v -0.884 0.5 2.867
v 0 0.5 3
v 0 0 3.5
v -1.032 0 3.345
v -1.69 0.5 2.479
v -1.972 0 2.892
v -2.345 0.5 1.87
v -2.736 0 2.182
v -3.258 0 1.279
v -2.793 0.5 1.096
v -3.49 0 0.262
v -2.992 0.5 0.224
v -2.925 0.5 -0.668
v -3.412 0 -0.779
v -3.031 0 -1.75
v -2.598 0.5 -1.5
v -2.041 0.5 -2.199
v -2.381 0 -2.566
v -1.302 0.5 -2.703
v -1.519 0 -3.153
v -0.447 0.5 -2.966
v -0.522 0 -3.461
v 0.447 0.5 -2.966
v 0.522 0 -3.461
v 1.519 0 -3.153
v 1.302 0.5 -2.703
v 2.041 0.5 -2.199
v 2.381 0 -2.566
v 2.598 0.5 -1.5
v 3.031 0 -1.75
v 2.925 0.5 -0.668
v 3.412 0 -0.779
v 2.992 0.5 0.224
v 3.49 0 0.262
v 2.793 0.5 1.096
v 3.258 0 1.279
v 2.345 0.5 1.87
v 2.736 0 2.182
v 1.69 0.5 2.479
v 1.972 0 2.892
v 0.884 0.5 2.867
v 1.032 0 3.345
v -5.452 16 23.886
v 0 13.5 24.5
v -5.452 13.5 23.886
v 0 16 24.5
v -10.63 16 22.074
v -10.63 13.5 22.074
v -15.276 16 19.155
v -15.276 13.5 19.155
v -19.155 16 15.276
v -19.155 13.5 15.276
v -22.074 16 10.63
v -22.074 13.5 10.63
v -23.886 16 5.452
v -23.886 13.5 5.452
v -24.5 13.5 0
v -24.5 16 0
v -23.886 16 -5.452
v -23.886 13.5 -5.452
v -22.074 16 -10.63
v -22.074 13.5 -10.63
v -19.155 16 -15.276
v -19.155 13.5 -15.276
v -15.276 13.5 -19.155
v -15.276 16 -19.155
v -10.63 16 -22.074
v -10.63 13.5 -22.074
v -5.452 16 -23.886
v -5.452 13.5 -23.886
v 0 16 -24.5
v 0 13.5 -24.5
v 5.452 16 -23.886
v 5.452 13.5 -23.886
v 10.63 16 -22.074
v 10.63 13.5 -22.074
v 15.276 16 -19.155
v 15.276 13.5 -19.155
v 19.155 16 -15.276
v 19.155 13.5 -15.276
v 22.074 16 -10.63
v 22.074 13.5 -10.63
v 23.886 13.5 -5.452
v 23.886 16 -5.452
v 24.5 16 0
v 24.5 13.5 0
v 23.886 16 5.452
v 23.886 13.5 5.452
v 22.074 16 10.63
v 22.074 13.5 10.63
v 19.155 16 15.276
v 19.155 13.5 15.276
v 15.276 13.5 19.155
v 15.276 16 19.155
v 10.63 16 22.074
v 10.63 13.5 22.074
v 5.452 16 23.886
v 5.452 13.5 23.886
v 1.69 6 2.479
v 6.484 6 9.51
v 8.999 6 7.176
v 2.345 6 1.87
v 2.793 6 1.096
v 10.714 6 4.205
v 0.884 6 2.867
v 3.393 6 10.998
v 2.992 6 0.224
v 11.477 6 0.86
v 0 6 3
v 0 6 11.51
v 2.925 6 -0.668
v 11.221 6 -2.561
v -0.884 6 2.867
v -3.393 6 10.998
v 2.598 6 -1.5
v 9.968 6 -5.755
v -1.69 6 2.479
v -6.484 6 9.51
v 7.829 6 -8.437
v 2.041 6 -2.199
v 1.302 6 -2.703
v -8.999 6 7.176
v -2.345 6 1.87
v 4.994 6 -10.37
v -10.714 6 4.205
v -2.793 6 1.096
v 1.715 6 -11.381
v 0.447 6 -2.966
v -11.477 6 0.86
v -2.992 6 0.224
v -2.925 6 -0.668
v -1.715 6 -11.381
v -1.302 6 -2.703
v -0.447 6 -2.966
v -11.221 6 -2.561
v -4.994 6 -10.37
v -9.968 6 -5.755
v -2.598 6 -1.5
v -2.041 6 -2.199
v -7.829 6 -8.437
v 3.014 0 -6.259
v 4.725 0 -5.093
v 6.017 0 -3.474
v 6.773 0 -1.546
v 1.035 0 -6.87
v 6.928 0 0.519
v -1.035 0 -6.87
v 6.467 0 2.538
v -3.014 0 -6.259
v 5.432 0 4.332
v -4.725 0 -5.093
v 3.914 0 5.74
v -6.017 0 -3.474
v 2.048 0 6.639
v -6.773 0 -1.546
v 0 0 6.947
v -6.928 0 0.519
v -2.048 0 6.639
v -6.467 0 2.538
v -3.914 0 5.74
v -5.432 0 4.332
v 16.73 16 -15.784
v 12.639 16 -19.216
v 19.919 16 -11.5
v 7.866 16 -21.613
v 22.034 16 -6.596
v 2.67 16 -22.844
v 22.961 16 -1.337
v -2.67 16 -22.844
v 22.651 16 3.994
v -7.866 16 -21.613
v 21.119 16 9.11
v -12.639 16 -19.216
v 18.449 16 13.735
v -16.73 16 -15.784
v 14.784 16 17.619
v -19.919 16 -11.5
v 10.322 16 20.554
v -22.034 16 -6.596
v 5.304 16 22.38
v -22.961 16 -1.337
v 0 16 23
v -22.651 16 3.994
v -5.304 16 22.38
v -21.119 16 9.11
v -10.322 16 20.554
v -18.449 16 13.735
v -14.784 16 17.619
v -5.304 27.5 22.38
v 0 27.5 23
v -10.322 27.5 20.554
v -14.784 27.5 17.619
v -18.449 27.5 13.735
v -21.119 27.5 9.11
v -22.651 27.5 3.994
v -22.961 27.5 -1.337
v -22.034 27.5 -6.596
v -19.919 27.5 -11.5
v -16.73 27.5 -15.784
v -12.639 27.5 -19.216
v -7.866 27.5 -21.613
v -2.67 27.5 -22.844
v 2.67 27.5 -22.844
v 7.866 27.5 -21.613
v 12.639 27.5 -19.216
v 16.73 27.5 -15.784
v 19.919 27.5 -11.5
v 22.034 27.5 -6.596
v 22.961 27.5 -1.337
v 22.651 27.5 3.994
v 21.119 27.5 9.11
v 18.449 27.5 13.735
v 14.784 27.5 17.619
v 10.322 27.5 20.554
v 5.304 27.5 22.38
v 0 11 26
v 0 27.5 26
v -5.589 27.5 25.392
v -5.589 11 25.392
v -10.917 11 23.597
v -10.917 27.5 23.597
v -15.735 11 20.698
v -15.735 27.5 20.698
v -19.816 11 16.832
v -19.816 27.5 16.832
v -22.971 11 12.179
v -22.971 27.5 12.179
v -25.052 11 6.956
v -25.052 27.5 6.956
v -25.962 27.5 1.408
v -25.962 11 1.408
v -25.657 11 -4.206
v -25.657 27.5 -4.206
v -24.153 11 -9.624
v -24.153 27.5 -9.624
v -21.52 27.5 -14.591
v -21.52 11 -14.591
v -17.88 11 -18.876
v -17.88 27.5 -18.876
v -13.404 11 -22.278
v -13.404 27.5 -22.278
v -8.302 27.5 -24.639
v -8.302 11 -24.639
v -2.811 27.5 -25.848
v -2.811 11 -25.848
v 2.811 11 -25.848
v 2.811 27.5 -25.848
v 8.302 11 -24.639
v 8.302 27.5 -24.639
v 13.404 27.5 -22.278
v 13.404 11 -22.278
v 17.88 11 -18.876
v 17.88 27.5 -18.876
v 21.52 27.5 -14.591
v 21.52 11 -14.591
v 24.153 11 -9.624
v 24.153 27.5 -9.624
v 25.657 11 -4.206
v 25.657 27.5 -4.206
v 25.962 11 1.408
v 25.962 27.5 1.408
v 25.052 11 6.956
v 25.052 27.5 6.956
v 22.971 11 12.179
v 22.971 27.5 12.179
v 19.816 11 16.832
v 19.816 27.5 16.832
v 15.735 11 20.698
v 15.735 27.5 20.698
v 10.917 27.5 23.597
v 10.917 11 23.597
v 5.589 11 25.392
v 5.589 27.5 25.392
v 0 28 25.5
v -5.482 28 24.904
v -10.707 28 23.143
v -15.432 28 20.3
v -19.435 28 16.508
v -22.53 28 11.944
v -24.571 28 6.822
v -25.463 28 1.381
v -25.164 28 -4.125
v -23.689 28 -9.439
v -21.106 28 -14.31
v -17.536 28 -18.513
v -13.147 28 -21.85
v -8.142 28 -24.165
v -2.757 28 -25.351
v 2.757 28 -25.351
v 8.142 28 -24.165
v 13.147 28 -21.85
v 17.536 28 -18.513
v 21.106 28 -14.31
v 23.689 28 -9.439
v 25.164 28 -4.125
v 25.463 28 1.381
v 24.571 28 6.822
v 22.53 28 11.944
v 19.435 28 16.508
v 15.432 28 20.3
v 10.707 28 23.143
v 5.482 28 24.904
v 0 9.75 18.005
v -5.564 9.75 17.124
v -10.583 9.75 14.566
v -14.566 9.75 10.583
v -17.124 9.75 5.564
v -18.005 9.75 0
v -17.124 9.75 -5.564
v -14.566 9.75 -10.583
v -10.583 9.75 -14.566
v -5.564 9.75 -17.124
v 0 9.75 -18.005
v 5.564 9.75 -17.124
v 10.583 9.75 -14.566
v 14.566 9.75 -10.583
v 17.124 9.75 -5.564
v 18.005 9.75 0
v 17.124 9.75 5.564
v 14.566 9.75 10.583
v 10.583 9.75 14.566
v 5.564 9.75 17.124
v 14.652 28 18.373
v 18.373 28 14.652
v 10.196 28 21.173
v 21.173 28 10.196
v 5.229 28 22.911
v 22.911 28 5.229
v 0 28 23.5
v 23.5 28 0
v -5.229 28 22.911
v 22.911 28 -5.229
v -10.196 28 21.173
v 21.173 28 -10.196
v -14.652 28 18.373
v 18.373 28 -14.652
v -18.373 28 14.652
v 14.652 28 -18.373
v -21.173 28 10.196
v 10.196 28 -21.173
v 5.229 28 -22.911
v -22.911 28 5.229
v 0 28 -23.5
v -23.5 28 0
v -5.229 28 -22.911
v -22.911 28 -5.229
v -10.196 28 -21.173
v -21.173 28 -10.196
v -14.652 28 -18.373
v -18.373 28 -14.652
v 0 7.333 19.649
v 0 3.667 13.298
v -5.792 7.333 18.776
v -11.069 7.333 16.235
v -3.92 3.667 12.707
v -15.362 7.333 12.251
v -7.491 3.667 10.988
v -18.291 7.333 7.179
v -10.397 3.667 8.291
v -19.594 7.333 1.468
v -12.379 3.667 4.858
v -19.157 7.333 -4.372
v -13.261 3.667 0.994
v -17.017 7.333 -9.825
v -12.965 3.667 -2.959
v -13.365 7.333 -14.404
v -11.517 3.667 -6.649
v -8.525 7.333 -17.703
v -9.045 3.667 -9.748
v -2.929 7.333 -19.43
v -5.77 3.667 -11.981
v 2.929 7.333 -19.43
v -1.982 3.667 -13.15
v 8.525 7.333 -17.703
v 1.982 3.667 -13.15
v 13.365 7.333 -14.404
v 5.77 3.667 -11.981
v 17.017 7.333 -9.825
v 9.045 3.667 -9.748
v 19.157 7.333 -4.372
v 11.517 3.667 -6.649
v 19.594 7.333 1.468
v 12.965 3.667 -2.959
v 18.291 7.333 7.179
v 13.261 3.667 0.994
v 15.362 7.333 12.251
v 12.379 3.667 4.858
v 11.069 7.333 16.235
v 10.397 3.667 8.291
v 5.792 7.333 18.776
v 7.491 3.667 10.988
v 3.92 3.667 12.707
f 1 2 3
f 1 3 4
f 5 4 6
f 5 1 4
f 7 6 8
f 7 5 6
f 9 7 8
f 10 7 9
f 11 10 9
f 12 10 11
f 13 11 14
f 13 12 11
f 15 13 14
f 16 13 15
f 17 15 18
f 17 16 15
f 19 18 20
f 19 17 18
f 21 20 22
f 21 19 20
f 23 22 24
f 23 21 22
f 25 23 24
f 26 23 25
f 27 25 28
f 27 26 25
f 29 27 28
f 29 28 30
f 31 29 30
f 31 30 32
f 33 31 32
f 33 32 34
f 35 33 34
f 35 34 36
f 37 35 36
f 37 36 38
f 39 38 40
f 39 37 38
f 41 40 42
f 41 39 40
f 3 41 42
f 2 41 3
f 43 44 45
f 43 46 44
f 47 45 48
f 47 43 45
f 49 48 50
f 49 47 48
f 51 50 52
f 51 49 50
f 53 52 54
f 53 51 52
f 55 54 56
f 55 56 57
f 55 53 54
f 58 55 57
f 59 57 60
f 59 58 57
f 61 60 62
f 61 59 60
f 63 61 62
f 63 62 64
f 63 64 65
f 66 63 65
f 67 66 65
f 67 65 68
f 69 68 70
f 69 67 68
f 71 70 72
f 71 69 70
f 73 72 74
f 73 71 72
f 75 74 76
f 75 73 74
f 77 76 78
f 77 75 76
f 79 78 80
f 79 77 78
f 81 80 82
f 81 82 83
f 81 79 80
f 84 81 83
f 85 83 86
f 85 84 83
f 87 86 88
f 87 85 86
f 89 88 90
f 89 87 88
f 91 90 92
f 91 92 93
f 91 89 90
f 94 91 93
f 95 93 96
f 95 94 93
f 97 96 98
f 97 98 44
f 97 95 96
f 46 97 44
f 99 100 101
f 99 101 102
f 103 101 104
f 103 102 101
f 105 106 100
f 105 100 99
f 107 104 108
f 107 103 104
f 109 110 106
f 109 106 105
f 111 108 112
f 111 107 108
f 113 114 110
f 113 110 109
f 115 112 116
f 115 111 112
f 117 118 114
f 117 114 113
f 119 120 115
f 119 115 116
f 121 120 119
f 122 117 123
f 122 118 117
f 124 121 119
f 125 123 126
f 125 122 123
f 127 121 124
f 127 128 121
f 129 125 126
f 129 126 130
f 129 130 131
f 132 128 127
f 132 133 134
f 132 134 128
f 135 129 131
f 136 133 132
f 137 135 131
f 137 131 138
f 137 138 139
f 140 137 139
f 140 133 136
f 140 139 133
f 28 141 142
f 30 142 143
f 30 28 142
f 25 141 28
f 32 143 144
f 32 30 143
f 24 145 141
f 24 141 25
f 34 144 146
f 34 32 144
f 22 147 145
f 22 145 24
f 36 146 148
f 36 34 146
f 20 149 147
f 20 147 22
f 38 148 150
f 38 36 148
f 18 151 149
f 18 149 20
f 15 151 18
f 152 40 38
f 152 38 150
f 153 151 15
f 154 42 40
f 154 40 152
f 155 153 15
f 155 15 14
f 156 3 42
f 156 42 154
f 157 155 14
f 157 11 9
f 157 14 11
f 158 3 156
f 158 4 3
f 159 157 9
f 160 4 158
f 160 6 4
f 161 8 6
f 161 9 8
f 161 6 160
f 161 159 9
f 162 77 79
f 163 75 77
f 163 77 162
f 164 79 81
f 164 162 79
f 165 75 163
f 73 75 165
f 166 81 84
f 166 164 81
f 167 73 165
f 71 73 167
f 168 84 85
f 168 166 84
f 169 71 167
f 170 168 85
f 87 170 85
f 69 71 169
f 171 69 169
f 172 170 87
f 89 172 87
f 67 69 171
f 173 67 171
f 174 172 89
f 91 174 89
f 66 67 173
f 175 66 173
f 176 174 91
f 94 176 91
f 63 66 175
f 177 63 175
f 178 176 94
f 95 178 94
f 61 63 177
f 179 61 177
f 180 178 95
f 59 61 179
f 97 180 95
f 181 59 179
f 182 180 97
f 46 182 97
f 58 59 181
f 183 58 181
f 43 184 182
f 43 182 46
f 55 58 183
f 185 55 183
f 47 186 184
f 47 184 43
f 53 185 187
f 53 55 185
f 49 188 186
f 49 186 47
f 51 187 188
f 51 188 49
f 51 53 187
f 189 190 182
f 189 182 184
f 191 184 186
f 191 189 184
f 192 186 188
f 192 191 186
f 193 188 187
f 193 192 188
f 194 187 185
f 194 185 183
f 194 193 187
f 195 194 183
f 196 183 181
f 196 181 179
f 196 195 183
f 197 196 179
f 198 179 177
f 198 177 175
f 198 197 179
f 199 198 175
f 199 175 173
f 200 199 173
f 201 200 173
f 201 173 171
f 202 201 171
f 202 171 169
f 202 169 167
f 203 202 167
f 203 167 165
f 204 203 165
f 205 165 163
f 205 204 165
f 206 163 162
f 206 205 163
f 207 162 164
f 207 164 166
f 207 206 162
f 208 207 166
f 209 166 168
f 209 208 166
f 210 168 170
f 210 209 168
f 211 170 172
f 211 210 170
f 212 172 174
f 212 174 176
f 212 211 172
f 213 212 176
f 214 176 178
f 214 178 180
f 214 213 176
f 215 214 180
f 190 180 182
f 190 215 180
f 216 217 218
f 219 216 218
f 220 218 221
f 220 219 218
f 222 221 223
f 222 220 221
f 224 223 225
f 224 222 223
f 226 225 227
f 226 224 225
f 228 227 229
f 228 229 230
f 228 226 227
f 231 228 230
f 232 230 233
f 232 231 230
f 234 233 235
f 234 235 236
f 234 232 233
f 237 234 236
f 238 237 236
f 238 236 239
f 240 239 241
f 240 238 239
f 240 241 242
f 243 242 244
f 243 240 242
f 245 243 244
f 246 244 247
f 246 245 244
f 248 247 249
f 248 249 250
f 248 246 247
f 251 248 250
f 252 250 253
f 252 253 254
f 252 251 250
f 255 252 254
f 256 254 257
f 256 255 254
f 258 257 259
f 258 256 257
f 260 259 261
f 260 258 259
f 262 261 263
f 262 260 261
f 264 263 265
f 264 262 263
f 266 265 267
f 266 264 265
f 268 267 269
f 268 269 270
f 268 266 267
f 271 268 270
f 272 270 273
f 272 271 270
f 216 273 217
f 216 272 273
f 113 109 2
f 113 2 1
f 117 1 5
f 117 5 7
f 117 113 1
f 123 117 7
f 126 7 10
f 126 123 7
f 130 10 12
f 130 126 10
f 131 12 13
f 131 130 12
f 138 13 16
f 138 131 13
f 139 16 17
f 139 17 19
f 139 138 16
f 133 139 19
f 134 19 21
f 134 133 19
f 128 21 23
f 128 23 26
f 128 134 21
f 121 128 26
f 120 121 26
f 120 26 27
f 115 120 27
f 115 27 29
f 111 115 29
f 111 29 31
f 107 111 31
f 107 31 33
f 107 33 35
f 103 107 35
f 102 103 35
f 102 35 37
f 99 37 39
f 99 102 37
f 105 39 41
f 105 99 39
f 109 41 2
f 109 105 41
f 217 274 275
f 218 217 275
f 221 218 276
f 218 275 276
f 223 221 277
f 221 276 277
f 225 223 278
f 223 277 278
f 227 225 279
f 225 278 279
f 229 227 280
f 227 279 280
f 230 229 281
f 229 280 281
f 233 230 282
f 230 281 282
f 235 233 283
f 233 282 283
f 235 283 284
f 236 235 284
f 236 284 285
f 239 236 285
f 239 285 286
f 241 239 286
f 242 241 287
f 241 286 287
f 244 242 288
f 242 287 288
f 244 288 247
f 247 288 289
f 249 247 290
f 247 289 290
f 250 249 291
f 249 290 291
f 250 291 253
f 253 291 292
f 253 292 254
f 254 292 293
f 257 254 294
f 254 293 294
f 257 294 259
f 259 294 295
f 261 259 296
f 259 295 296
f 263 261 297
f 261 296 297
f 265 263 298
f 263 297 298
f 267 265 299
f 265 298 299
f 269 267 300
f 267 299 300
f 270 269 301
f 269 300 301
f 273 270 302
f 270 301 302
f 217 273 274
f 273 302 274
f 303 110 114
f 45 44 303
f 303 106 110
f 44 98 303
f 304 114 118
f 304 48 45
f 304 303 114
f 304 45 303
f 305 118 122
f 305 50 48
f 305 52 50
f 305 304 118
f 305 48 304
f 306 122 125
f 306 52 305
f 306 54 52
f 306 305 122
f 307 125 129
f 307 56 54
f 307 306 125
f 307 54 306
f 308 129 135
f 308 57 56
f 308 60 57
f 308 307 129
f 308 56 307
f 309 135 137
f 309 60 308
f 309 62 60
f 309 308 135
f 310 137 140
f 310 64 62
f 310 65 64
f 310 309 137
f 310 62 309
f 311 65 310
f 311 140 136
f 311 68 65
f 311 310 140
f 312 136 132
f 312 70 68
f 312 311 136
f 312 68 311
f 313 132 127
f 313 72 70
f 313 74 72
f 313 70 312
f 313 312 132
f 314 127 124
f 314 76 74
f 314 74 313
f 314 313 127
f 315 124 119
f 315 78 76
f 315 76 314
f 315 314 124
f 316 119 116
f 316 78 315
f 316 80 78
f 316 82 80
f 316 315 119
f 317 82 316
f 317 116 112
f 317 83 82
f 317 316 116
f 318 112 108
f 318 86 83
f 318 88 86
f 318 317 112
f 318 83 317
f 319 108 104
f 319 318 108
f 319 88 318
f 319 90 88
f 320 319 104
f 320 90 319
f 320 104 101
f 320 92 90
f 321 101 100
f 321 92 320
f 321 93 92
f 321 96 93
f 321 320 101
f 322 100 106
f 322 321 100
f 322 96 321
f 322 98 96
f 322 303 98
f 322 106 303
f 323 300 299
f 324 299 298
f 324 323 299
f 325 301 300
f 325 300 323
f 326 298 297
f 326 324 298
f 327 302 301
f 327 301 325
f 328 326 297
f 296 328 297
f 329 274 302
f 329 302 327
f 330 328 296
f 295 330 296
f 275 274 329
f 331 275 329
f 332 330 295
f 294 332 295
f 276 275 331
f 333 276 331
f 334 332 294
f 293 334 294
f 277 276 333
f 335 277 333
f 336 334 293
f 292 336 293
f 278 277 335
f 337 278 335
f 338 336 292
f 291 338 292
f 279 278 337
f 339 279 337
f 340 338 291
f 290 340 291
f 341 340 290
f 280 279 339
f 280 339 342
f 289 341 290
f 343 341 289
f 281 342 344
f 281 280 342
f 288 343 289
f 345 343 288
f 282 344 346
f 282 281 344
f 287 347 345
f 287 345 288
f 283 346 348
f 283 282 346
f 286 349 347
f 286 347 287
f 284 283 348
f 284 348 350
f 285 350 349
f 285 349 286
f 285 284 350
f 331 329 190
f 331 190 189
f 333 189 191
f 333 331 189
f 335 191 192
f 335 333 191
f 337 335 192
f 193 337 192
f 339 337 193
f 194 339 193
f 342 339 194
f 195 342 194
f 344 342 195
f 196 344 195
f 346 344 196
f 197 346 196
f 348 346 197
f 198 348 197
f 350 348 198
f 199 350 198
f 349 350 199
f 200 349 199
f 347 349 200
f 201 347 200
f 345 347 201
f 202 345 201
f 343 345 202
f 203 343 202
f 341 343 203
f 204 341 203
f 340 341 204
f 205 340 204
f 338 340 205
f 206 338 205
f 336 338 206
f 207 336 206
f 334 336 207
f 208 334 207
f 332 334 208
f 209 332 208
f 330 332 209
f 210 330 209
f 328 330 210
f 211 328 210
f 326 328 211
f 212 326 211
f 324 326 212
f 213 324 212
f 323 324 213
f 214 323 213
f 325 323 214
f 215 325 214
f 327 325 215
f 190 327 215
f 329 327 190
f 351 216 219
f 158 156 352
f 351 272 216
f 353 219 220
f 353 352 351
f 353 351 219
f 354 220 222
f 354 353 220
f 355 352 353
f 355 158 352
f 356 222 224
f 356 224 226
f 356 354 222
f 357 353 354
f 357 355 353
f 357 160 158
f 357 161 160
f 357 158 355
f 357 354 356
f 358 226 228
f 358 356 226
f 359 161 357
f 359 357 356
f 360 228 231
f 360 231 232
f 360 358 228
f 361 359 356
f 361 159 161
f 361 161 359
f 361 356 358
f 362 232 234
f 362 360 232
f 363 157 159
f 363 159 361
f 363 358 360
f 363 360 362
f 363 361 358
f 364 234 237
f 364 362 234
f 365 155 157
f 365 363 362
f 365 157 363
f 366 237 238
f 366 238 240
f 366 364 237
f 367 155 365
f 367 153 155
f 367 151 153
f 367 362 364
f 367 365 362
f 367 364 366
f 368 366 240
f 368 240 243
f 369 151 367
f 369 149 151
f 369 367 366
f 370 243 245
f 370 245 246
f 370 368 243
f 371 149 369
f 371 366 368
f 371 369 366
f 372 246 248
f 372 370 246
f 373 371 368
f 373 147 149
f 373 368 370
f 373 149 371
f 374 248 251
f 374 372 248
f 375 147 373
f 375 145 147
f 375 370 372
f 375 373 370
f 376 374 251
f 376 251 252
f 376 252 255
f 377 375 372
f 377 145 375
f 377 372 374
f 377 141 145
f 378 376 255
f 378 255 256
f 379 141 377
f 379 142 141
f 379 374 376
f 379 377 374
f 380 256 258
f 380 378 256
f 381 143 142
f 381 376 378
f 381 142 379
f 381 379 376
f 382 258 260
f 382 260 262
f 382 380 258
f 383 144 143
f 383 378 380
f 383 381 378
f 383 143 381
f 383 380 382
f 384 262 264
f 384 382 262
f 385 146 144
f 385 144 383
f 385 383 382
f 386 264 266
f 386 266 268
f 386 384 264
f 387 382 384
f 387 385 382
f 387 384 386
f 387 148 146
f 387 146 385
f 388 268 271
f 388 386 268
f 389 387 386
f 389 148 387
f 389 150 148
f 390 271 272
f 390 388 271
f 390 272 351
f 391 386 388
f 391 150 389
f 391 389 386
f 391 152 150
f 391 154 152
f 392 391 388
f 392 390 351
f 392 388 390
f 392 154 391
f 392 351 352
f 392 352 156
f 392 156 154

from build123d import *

# Parameters (mm, degrees)
CHAMFER_1_SIZE = 0.5


with BuildPart() as part:
    # Эскиз1 → Повернуть1 (revolve)
    with BuildSketch(Plane.XY):
        Polygon((-26, 28), (-26, 11), (-6.947441117, 0), (-3, 0), (-3, 6), (-11.509618943, 6), (-24.5, 13.5), (-24.5, 16), (-23, 16), (-23, 28), align=None)
    revolve(axis=Axis((0, 26.168985987, 0), (0, -1, 0)))

    # Фаска1
    chamfer_1_edges = [part.edges().sort_by_distance(p)[0] for p in [
        (3, 0, 0),
        (26, 28, 0),
        (23, 28, 0),
    ]]
    chamfer(chamfer_1_edges, length=CHAMFER_1_SIZE)


solid = part.part
